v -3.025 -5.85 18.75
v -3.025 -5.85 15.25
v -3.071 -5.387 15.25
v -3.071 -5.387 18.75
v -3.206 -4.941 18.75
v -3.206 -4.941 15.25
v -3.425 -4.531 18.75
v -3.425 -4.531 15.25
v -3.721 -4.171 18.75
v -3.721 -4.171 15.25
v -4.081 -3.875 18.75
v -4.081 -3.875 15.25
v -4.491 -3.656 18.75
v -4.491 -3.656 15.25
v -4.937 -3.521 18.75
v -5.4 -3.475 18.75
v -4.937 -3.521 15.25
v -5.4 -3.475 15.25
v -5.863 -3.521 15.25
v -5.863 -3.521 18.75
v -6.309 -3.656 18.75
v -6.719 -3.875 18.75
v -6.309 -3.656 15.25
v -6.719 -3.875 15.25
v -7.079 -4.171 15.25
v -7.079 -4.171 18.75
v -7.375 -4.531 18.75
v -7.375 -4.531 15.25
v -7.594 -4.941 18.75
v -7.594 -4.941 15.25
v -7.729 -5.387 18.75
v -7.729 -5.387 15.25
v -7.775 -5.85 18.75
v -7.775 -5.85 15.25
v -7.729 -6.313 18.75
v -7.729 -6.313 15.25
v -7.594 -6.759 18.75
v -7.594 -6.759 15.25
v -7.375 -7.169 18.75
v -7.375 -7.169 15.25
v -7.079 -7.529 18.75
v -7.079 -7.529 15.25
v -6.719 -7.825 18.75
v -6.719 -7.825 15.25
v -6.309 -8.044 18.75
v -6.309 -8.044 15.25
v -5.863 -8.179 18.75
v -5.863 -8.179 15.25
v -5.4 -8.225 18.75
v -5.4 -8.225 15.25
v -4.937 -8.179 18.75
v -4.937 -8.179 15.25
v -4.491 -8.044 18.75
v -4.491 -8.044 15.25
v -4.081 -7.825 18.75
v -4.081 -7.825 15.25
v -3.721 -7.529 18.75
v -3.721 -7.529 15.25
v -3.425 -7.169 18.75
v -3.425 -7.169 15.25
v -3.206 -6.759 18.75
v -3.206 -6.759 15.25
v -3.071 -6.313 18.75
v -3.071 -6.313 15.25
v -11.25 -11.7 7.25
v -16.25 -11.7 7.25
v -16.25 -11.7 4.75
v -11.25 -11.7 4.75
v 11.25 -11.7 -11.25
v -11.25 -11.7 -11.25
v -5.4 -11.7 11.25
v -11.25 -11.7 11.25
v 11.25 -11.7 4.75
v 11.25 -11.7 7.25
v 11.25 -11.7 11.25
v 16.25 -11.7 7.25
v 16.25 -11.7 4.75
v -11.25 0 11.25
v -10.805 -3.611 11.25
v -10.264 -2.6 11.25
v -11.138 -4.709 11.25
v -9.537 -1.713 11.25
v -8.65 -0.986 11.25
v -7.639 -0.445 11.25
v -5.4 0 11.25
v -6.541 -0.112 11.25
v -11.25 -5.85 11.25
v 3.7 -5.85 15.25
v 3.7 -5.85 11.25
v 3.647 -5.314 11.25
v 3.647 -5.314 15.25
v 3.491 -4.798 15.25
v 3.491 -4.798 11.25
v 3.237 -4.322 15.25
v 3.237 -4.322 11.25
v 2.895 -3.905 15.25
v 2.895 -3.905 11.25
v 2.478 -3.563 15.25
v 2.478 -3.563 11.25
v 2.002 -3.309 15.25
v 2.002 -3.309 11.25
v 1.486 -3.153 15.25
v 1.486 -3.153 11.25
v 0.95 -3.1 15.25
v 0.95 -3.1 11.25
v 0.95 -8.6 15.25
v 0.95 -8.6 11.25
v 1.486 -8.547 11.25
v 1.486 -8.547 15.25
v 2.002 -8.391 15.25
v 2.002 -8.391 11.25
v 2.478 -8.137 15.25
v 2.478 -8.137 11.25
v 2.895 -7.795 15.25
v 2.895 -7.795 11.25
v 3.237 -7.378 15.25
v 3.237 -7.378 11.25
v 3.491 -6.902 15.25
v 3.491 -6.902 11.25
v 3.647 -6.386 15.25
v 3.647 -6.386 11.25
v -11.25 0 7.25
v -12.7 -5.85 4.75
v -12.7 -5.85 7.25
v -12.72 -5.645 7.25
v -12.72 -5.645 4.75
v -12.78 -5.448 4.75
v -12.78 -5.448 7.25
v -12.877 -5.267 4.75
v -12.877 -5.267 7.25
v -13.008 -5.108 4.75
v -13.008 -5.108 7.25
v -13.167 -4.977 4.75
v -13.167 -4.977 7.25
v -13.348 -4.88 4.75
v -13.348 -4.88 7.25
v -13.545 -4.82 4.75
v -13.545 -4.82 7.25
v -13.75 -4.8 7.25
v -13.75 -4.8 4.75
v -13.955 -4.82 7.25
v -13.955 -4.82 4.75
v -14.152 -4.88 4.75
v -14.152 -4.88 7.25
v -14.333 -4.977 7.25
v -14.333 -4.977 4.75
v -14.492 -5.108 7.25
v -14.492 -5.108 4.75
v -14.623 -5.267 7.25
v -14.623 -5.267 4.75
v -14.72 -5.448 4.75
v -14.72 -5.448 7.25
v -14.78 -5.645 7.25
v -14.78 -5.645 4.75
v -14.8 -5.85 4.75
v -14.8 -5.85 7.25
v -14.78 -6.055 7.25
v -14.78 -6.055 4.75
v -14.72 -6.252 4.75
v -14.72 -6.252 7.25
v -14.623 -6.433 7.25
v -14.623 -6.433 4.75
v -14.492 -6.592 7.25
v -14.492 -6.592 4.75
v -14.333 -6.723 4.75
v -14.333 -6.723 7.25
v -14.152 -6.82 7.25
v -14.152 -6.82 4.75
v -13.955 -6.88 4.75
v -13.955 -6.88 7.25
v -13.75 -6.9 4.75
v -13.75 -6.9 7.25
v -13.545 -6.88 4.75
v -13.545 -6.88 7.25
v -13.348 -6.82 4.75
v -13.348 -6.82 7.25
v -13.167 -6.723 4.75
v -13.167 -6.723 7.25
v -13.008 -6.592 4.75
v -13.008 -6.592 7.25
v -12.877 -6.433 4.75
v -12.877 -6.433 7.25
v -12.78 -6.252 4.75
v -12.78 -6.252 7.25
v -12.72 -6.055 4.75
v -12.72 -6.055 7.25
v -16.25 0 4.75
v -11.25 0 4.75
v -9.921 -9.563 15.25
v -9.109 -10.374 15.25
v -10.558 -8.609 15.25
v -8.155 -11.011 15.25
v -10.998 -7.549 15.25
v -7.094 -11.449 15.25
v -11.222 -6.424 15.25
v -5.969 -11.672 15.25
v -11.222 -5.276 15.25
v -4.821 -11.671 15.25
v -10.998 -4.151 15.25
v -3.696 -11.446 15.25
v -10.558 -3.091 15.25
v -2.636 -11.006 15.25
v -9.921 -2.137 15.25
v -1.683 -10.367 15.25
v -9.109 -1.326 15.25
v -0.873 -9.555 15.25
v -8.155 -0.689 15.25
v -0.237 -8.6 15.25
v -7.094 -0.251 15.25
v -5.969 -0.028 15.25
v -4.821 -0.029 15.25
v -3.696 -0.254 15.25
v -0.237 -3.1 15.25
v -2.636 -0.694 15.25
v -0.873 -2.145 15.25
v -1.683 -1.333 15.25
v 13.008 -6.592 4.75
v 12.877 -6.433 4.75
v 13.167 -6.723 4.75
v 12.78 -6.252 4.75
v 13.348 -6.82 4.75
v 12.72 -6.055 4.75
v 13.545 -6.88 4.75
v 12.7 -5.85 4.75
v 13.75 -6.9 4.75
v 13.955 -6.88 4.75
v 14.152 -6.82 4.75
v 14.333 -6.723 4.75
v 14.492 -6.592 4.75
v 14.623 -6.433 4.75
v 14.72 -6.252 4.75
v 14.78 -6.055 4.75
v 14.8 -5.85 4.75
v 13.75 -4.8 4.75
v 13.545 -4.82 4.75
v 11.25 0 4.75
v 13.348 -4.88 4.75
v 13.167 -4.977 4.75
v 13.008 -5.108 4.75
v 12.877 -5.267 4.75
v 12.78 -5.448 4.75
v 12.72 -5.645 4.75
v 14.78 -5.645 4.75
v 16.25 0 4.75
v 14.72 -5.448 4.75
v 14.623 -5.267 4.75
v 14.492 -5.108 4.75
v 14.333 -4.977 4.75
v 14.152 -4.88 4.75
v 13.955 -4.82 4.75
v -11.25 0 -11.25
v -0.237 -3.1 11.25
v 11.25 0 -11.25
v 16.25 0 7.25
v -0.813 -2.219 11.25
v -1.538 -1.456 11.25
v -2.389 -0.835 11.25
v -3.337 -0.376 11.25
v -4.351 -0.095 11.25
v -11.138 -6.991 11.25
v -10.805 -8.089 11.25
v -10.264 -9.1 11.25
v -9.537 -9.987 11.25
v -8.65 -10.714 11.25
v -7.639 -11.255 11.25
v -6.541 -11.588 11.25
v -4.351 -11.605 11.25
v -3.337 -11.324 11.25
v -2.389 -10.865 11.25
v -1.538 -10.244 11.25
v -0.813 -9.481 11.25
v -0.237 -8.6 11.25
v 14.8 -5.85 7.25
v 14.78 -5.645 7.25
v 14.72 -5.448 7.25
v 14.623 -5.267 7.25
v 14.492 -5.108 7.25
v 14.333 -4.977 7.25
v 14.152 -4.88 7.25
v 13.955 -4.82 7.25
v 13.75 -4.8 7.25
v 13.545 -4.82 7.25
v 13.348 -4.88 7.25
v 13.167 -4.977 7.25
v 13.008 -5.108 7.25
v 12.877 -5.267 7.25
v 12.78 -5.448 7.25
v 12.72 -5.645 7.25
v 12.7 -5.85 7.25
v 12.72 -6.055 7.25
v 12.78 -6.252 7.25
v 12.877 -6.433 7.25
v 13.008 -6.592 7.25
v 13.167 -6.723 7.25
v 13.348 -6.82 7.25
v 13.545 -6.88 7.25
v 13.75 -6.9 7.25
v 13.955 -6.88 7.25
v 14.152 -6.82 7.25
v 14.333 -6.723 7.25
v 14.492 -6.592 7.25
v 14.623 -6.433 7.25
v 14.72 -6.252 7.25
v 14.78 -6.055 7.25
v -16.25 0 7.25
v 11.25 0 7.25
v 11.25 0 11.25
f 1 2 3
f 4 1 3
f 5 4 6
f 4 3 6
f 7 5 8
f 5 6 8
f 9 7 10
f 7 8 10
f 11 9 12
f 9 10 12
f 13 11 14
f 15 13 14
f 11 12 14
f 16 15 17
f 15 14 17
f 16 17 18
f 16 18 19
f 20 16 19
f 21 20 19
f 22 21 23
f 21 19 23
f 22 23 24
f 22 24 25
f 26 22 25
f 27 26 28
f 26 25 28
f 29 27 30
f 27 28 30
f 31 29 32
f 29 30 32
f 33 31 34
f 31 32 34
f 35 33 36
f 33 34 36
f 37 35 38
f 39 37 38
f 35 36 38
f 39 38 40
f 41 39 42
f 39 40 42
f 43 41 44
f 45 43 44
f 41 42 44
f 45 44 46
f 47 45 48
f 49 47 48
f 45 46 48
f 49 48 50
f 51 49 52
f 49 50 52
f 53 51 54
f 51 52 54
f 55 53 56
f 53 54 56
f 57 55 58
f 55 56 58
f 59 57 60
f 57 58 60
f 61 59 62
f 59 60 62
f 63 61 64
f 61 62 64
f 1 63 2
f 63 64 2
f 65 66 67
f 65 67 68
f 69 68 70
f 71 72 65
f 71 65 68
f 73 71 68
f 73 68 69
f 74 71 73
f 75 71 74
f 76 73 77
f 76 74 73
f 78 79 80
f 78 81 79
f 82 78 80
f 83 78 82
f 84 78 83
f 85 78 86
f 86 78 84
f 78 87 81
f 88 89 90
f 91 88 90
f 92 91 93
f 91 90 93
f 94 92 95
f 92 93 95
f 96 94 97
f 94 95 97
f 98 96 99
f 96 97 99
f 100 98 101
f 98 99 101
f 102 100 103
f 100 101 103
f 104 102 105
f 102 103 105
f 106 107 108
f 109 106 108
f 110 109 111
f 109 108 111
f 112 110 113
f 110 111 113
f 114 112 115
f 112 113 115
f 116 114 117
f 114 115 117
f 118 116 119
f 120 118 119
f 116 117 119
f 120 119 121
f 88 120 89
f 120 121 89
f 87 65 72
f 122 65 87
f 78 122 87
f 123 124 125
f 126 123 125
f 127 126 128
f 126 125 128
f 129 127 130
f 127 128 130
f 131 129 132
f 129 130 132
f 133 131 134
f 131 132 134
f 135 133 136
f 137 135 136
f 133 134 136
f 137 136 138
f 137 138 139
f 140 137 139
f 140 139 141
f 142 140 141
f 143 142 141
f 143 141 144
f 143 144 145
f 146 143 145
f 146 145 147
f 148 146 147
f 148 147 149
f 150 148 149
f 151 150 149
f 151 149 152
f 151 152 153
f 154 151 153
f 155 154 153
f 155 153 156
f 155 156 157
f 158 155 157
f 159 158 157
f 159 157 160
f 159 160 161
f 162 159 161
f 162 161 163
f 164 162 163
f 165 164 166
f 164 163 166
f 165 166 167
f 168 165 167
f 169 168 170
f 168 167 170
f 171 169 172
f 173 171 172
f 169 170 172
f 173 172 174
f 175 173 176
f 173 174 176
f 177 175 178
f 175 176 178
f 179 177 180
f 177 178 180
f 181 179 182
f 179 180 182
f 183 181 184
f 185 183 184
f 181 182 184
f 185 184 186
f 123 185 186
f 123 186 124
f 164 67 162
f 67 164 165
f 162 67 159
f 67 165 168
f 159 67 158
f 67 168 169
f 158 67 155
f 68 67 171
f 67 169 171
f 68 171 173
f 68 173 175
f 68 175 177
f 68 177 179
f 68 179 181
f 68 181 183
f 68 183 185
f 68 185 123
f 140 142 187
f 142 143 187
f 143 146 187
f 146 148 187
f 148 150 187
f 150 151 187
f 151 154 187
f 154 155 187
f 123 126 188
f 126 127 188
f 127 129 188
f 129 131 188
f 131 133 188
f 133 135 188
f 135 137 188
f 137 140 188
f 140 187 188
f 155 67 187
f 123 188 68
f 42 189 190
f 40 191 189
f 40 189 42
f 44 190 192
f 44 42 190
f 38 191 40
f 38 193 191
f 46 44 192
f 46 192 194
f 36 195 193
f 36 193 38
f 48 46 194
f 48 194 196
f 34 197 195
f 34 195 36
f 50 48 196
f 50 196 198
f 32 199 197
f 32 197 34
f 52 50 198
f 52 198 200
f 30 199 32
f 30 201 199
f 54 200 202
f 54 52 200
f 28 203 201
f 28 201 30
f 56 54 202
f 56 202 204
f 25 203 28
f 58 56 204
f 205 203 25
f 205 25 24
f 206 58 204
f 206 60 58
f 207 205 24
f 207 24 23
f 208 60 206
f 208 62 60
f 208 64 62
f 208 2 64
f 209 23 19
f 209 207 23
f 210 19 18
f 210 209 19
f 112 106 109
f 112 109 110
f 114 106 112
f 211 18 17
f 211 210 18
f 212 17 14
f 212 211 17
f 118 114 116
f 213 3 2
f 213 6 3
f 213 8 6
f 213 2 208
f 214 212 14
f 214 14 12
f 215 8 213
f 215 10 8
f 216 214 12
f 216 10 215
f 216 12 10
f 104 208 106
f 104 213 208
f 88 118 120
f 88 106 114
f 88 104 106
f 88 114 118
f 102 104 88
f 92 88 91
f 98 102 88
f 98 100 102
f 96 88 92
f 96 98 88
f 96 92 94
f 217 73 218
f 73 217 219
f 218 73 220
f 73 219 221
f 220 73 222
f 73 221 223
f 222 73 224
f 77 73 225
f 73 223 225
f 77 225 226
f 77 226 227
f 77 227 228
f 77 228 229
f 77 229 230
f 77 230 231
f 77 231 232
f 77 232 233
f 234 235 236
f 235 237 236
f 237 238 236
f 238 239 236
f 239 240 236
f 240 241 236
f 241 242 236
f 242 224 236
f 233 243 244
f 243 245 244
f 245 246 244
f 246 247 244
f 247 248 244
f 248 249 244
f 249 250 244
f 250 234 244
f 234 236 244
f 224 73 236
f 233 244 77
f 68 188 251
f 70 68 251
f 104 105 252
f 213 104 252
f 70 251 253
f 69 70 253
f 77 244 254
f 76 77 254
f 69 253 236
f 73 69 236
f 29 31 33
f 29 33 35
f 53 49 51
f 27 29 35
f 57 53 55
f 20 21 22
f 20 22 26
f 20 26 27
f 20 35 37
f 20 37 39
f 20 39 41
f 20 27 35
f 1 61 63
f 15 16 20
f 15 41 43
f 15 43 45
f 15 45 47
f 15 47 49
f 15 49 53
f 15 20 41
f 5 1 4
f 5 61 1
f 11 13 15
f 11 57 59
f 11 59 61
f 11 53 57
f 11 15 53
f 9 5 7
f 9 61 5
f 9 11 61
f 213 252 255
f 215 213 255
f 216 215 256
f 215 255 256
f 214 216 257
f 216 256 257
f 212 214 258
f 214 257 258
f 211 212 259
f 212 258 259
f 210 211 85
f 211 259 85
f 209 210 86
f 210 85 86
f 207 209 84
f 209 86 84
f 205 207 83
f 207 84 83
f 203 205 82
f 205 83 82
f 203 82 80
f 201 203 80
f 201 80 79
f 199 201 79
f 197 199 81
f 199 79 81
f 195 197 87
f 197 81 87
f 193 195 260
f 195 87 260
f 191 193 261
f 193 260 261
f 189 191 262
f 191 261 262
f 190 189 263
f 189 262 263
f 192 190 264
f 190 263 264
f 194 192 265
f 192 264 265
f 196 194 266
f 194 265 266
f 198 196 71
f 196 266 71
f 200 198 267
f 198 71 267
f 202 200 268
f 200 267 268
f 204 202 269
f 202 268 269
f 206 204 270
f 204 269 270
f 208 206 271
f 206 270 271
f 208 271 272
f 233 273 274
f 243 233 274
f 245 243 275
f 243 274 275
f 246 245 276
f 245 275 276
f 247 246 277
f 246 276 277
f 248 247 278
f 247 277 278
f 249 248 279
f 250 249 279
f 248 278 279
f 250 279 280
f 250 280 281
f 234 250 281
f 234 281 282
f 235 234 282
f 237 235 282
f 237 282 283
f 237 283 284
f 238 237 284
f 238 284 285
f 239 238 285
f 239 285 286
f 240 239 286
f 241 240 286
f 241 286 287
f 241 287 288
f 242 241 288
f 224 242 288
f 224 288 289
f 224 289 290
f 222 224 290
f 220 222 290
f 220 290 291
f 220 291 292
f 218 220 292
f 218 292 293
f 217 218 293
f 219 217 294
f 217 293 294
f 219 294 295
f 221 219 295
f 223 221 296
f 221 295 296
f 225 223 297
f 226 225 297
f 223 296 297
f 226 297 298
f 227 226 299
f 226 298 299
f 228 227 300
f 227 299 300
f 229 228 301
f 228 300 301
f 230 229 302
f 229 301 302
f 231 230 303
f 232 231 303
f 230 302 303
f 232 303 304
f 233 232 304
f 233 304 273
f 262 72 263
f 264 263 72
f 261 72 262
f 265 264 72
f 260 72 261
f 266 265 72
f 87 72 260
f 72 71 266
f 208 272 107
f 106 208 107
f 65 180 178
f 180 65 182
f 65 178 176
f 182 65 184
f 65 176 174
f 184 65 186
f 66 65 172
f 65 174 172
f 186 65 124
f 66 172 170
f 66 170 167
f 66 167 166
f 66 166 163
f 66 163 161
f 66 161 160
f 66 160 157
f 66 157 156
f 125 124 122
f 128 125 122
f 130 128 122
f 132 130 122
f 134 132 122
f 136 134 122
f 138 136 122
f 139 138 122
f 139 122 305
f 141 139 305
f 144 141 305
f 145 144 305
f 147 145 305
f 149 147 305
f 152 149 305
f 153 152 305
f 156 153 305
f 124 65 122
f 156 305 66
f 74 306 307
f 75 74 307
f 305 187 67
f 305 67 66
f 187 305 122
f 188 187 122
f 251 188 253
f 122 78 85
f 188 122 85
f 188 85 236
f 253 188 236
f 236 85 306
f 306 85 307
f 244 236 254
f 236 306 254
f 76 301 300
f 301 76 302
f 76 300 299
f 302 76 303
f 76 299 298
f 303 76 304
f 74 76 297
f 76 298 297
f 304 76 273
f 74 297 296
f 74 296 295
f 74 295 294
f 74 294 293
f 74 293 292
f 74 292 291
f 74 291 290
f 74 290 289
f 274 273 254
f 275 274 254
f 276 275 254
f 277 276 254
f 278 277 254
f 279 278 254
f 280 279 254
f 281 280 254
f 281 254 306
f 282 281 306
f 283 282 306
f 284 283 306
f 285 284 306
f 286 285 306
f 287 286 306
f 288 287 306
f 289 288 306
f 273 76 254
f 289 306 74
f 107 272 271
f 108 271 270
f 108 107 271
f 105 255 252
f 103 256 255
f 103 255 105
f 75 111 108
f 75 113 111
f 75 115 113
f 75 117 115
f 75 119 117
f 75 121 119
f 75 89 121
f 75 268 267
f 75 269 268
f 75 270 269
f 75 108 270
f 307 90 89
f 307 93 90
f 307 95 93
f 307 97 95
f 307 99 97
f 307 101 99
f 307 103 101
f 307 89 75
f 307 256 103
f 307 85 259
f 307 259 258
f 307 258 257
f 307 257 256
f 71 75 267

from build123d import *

# Parameters (mm, degrees)
F0_W     = 22.5
F0_H     = 16
F0_H_2   = 2.5
F0_W_2   = 5
F0_H_3   = 4
F1_DEPTH = 11.7
F3_DEPTH = 4
F4_R     = 1.05
F5_DEPTH = 25
F6_R     = 2.375
F7_DEPTH = 3.5


with BuildPart() as f1:
    # F0 (on Front) → F1 (new body)
    with BuildSketch(Plane.XZ):
        with Locations((0, -3.25)):
            Rectangle(F0_W, F0_H)
        with Locations((0, 6)):
            Rectangle(F0_W, F0_H_2)
        with Locations((13.75, 6)):
            Rectangle(F0_W_2, F0_H_2)
        with Locations((-13.75, 6)):
            Rectangle(F0_W_2, F0_H_2)
        with Locations((0, 9.25)):
            Rectangle(F0_W, F0_H_3)
    extrude(amount=F1_DEPTH)

    # F2 (on face) → F3 (join)
    with BuildSketch(Plane.XY.offset(11.25)):
        with BuildLine():
            ThreePointArc((-0.1257874016, -3.3191540018), (-0.1800773211, -3.2089950347), (-0.2366677426, -3.1))
            ThreePointArc((-0.2366677426, -3.1), (-11.25, -5.85), (-0.2366677426, -8.6))
            ThreePointArc((-0.2366677426, -8.6), (-0.1800773211, -8.4910049653), (-0.1257874016, -8.3808459982))
            ThreePointArc((-0.1257874016, -8.3808459982), (-1.8, -5.85), (-0.1257874016, -3.3191540018))
        make_face()
        with BuildLine():
            Line((0.95, -3.1), (-0.2366677426, -3.1))
            ThreePointArc((-0.2366677426, -3.1), (-0.1800773211, -3.2089950347), (-0.1257874016, -3.3191540018))
            ThreePointArc((-0.1257874016, -3.3191540018), (0.4010585163, -3.1553454308), (0.95, -3.1))
        make_face()
        with BuildLine():
            ThreePointArc((-0.1257874016, -8.3808459982), (-0.1800773211, -8.4910049653), (-0.2366677426, -8.6))
            Line((-0.2366677426, -8.6), (0.95, -8.6))
            ThreePointArc((0.95, -8.6), (0.4010585163, -8.5446545692), (-0.1257874016, -8.3808459982))
        make_face()
        with BuildLine():
            ThreePointArc((0.95, -3.1), (0.4010585163, -3.1553454308), (-0.1257874016, -3.3191540018))
            ThreePointArc((-0.1257874016, -3.3191540018), (0.3042371839, -4.552241105), (0.45, -5.85))
            ThreePointArc((0.45, -5.85), (0.3042371839, -7.147758895), (-0.1257874016, -8.3808459982))
            ThreePointArc((-0.1257874016, -8.3808459982), (0.4010585163, -8.5446545692), (0.95, -8.6))
            ThreePointArc((0.95, -8.6), (2.8945436483, -7.7945436483), (3.7, -5.85))
            ThreePointArc((3.7, -5.85), (2.8945436483, -3.9054563517), (0.95, -3.1))
        make_face()
        with BuildLine():
            ThreePointArc((-0.1257874016, -8.3808459982), (0.3042371839, -7.147758895), (0.45, -5.85))
            ThreePointArc((0.45, -5.85), (0.3042371839, -4.552241105), (-0.1257874016, -3.3191540018))
            ThreePointArc((-0.1257874016, -3.3191540018), (-1.8, -5.85), (-0.1257874016, -8.3808459982))
        make_face()
    extrude(amount=F3_DEPTH)

    # F4 (on face) → F5 (cut)
    with BuildSketch(Plane.XY.offset(7.25)):
        with Locations((-13.75, -5.85)):
            Circle(F4_R)
        with Locations((13.75, -5.85)):
            Circle(F4_R)
    extrude(amount=-F5_DEPTH, mode=Mode.SUBTRACT)

    # F6 (on face) → F7 (join)
    with BuildSketch(Plane.XY.offset(15.25)):
        with Locations((-5.4, -5.85)):
            Circle(F6_R)
    extrude(amount=F7_DEPTH)


solid = f1.part
